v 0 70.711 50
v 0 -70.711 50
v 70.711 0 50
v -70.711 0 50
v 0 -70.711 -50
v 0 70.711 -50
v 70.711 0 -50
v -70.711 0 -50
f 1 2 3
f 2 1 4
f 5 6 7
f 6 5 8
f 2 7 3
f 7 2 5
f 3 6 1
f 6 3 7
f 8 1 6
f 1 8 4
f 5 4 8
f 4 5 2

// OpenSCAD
rotate(a=[0.0,0.0,45.0]){cube(size=[100.0000,100.0000,100.0000],center=true);}
